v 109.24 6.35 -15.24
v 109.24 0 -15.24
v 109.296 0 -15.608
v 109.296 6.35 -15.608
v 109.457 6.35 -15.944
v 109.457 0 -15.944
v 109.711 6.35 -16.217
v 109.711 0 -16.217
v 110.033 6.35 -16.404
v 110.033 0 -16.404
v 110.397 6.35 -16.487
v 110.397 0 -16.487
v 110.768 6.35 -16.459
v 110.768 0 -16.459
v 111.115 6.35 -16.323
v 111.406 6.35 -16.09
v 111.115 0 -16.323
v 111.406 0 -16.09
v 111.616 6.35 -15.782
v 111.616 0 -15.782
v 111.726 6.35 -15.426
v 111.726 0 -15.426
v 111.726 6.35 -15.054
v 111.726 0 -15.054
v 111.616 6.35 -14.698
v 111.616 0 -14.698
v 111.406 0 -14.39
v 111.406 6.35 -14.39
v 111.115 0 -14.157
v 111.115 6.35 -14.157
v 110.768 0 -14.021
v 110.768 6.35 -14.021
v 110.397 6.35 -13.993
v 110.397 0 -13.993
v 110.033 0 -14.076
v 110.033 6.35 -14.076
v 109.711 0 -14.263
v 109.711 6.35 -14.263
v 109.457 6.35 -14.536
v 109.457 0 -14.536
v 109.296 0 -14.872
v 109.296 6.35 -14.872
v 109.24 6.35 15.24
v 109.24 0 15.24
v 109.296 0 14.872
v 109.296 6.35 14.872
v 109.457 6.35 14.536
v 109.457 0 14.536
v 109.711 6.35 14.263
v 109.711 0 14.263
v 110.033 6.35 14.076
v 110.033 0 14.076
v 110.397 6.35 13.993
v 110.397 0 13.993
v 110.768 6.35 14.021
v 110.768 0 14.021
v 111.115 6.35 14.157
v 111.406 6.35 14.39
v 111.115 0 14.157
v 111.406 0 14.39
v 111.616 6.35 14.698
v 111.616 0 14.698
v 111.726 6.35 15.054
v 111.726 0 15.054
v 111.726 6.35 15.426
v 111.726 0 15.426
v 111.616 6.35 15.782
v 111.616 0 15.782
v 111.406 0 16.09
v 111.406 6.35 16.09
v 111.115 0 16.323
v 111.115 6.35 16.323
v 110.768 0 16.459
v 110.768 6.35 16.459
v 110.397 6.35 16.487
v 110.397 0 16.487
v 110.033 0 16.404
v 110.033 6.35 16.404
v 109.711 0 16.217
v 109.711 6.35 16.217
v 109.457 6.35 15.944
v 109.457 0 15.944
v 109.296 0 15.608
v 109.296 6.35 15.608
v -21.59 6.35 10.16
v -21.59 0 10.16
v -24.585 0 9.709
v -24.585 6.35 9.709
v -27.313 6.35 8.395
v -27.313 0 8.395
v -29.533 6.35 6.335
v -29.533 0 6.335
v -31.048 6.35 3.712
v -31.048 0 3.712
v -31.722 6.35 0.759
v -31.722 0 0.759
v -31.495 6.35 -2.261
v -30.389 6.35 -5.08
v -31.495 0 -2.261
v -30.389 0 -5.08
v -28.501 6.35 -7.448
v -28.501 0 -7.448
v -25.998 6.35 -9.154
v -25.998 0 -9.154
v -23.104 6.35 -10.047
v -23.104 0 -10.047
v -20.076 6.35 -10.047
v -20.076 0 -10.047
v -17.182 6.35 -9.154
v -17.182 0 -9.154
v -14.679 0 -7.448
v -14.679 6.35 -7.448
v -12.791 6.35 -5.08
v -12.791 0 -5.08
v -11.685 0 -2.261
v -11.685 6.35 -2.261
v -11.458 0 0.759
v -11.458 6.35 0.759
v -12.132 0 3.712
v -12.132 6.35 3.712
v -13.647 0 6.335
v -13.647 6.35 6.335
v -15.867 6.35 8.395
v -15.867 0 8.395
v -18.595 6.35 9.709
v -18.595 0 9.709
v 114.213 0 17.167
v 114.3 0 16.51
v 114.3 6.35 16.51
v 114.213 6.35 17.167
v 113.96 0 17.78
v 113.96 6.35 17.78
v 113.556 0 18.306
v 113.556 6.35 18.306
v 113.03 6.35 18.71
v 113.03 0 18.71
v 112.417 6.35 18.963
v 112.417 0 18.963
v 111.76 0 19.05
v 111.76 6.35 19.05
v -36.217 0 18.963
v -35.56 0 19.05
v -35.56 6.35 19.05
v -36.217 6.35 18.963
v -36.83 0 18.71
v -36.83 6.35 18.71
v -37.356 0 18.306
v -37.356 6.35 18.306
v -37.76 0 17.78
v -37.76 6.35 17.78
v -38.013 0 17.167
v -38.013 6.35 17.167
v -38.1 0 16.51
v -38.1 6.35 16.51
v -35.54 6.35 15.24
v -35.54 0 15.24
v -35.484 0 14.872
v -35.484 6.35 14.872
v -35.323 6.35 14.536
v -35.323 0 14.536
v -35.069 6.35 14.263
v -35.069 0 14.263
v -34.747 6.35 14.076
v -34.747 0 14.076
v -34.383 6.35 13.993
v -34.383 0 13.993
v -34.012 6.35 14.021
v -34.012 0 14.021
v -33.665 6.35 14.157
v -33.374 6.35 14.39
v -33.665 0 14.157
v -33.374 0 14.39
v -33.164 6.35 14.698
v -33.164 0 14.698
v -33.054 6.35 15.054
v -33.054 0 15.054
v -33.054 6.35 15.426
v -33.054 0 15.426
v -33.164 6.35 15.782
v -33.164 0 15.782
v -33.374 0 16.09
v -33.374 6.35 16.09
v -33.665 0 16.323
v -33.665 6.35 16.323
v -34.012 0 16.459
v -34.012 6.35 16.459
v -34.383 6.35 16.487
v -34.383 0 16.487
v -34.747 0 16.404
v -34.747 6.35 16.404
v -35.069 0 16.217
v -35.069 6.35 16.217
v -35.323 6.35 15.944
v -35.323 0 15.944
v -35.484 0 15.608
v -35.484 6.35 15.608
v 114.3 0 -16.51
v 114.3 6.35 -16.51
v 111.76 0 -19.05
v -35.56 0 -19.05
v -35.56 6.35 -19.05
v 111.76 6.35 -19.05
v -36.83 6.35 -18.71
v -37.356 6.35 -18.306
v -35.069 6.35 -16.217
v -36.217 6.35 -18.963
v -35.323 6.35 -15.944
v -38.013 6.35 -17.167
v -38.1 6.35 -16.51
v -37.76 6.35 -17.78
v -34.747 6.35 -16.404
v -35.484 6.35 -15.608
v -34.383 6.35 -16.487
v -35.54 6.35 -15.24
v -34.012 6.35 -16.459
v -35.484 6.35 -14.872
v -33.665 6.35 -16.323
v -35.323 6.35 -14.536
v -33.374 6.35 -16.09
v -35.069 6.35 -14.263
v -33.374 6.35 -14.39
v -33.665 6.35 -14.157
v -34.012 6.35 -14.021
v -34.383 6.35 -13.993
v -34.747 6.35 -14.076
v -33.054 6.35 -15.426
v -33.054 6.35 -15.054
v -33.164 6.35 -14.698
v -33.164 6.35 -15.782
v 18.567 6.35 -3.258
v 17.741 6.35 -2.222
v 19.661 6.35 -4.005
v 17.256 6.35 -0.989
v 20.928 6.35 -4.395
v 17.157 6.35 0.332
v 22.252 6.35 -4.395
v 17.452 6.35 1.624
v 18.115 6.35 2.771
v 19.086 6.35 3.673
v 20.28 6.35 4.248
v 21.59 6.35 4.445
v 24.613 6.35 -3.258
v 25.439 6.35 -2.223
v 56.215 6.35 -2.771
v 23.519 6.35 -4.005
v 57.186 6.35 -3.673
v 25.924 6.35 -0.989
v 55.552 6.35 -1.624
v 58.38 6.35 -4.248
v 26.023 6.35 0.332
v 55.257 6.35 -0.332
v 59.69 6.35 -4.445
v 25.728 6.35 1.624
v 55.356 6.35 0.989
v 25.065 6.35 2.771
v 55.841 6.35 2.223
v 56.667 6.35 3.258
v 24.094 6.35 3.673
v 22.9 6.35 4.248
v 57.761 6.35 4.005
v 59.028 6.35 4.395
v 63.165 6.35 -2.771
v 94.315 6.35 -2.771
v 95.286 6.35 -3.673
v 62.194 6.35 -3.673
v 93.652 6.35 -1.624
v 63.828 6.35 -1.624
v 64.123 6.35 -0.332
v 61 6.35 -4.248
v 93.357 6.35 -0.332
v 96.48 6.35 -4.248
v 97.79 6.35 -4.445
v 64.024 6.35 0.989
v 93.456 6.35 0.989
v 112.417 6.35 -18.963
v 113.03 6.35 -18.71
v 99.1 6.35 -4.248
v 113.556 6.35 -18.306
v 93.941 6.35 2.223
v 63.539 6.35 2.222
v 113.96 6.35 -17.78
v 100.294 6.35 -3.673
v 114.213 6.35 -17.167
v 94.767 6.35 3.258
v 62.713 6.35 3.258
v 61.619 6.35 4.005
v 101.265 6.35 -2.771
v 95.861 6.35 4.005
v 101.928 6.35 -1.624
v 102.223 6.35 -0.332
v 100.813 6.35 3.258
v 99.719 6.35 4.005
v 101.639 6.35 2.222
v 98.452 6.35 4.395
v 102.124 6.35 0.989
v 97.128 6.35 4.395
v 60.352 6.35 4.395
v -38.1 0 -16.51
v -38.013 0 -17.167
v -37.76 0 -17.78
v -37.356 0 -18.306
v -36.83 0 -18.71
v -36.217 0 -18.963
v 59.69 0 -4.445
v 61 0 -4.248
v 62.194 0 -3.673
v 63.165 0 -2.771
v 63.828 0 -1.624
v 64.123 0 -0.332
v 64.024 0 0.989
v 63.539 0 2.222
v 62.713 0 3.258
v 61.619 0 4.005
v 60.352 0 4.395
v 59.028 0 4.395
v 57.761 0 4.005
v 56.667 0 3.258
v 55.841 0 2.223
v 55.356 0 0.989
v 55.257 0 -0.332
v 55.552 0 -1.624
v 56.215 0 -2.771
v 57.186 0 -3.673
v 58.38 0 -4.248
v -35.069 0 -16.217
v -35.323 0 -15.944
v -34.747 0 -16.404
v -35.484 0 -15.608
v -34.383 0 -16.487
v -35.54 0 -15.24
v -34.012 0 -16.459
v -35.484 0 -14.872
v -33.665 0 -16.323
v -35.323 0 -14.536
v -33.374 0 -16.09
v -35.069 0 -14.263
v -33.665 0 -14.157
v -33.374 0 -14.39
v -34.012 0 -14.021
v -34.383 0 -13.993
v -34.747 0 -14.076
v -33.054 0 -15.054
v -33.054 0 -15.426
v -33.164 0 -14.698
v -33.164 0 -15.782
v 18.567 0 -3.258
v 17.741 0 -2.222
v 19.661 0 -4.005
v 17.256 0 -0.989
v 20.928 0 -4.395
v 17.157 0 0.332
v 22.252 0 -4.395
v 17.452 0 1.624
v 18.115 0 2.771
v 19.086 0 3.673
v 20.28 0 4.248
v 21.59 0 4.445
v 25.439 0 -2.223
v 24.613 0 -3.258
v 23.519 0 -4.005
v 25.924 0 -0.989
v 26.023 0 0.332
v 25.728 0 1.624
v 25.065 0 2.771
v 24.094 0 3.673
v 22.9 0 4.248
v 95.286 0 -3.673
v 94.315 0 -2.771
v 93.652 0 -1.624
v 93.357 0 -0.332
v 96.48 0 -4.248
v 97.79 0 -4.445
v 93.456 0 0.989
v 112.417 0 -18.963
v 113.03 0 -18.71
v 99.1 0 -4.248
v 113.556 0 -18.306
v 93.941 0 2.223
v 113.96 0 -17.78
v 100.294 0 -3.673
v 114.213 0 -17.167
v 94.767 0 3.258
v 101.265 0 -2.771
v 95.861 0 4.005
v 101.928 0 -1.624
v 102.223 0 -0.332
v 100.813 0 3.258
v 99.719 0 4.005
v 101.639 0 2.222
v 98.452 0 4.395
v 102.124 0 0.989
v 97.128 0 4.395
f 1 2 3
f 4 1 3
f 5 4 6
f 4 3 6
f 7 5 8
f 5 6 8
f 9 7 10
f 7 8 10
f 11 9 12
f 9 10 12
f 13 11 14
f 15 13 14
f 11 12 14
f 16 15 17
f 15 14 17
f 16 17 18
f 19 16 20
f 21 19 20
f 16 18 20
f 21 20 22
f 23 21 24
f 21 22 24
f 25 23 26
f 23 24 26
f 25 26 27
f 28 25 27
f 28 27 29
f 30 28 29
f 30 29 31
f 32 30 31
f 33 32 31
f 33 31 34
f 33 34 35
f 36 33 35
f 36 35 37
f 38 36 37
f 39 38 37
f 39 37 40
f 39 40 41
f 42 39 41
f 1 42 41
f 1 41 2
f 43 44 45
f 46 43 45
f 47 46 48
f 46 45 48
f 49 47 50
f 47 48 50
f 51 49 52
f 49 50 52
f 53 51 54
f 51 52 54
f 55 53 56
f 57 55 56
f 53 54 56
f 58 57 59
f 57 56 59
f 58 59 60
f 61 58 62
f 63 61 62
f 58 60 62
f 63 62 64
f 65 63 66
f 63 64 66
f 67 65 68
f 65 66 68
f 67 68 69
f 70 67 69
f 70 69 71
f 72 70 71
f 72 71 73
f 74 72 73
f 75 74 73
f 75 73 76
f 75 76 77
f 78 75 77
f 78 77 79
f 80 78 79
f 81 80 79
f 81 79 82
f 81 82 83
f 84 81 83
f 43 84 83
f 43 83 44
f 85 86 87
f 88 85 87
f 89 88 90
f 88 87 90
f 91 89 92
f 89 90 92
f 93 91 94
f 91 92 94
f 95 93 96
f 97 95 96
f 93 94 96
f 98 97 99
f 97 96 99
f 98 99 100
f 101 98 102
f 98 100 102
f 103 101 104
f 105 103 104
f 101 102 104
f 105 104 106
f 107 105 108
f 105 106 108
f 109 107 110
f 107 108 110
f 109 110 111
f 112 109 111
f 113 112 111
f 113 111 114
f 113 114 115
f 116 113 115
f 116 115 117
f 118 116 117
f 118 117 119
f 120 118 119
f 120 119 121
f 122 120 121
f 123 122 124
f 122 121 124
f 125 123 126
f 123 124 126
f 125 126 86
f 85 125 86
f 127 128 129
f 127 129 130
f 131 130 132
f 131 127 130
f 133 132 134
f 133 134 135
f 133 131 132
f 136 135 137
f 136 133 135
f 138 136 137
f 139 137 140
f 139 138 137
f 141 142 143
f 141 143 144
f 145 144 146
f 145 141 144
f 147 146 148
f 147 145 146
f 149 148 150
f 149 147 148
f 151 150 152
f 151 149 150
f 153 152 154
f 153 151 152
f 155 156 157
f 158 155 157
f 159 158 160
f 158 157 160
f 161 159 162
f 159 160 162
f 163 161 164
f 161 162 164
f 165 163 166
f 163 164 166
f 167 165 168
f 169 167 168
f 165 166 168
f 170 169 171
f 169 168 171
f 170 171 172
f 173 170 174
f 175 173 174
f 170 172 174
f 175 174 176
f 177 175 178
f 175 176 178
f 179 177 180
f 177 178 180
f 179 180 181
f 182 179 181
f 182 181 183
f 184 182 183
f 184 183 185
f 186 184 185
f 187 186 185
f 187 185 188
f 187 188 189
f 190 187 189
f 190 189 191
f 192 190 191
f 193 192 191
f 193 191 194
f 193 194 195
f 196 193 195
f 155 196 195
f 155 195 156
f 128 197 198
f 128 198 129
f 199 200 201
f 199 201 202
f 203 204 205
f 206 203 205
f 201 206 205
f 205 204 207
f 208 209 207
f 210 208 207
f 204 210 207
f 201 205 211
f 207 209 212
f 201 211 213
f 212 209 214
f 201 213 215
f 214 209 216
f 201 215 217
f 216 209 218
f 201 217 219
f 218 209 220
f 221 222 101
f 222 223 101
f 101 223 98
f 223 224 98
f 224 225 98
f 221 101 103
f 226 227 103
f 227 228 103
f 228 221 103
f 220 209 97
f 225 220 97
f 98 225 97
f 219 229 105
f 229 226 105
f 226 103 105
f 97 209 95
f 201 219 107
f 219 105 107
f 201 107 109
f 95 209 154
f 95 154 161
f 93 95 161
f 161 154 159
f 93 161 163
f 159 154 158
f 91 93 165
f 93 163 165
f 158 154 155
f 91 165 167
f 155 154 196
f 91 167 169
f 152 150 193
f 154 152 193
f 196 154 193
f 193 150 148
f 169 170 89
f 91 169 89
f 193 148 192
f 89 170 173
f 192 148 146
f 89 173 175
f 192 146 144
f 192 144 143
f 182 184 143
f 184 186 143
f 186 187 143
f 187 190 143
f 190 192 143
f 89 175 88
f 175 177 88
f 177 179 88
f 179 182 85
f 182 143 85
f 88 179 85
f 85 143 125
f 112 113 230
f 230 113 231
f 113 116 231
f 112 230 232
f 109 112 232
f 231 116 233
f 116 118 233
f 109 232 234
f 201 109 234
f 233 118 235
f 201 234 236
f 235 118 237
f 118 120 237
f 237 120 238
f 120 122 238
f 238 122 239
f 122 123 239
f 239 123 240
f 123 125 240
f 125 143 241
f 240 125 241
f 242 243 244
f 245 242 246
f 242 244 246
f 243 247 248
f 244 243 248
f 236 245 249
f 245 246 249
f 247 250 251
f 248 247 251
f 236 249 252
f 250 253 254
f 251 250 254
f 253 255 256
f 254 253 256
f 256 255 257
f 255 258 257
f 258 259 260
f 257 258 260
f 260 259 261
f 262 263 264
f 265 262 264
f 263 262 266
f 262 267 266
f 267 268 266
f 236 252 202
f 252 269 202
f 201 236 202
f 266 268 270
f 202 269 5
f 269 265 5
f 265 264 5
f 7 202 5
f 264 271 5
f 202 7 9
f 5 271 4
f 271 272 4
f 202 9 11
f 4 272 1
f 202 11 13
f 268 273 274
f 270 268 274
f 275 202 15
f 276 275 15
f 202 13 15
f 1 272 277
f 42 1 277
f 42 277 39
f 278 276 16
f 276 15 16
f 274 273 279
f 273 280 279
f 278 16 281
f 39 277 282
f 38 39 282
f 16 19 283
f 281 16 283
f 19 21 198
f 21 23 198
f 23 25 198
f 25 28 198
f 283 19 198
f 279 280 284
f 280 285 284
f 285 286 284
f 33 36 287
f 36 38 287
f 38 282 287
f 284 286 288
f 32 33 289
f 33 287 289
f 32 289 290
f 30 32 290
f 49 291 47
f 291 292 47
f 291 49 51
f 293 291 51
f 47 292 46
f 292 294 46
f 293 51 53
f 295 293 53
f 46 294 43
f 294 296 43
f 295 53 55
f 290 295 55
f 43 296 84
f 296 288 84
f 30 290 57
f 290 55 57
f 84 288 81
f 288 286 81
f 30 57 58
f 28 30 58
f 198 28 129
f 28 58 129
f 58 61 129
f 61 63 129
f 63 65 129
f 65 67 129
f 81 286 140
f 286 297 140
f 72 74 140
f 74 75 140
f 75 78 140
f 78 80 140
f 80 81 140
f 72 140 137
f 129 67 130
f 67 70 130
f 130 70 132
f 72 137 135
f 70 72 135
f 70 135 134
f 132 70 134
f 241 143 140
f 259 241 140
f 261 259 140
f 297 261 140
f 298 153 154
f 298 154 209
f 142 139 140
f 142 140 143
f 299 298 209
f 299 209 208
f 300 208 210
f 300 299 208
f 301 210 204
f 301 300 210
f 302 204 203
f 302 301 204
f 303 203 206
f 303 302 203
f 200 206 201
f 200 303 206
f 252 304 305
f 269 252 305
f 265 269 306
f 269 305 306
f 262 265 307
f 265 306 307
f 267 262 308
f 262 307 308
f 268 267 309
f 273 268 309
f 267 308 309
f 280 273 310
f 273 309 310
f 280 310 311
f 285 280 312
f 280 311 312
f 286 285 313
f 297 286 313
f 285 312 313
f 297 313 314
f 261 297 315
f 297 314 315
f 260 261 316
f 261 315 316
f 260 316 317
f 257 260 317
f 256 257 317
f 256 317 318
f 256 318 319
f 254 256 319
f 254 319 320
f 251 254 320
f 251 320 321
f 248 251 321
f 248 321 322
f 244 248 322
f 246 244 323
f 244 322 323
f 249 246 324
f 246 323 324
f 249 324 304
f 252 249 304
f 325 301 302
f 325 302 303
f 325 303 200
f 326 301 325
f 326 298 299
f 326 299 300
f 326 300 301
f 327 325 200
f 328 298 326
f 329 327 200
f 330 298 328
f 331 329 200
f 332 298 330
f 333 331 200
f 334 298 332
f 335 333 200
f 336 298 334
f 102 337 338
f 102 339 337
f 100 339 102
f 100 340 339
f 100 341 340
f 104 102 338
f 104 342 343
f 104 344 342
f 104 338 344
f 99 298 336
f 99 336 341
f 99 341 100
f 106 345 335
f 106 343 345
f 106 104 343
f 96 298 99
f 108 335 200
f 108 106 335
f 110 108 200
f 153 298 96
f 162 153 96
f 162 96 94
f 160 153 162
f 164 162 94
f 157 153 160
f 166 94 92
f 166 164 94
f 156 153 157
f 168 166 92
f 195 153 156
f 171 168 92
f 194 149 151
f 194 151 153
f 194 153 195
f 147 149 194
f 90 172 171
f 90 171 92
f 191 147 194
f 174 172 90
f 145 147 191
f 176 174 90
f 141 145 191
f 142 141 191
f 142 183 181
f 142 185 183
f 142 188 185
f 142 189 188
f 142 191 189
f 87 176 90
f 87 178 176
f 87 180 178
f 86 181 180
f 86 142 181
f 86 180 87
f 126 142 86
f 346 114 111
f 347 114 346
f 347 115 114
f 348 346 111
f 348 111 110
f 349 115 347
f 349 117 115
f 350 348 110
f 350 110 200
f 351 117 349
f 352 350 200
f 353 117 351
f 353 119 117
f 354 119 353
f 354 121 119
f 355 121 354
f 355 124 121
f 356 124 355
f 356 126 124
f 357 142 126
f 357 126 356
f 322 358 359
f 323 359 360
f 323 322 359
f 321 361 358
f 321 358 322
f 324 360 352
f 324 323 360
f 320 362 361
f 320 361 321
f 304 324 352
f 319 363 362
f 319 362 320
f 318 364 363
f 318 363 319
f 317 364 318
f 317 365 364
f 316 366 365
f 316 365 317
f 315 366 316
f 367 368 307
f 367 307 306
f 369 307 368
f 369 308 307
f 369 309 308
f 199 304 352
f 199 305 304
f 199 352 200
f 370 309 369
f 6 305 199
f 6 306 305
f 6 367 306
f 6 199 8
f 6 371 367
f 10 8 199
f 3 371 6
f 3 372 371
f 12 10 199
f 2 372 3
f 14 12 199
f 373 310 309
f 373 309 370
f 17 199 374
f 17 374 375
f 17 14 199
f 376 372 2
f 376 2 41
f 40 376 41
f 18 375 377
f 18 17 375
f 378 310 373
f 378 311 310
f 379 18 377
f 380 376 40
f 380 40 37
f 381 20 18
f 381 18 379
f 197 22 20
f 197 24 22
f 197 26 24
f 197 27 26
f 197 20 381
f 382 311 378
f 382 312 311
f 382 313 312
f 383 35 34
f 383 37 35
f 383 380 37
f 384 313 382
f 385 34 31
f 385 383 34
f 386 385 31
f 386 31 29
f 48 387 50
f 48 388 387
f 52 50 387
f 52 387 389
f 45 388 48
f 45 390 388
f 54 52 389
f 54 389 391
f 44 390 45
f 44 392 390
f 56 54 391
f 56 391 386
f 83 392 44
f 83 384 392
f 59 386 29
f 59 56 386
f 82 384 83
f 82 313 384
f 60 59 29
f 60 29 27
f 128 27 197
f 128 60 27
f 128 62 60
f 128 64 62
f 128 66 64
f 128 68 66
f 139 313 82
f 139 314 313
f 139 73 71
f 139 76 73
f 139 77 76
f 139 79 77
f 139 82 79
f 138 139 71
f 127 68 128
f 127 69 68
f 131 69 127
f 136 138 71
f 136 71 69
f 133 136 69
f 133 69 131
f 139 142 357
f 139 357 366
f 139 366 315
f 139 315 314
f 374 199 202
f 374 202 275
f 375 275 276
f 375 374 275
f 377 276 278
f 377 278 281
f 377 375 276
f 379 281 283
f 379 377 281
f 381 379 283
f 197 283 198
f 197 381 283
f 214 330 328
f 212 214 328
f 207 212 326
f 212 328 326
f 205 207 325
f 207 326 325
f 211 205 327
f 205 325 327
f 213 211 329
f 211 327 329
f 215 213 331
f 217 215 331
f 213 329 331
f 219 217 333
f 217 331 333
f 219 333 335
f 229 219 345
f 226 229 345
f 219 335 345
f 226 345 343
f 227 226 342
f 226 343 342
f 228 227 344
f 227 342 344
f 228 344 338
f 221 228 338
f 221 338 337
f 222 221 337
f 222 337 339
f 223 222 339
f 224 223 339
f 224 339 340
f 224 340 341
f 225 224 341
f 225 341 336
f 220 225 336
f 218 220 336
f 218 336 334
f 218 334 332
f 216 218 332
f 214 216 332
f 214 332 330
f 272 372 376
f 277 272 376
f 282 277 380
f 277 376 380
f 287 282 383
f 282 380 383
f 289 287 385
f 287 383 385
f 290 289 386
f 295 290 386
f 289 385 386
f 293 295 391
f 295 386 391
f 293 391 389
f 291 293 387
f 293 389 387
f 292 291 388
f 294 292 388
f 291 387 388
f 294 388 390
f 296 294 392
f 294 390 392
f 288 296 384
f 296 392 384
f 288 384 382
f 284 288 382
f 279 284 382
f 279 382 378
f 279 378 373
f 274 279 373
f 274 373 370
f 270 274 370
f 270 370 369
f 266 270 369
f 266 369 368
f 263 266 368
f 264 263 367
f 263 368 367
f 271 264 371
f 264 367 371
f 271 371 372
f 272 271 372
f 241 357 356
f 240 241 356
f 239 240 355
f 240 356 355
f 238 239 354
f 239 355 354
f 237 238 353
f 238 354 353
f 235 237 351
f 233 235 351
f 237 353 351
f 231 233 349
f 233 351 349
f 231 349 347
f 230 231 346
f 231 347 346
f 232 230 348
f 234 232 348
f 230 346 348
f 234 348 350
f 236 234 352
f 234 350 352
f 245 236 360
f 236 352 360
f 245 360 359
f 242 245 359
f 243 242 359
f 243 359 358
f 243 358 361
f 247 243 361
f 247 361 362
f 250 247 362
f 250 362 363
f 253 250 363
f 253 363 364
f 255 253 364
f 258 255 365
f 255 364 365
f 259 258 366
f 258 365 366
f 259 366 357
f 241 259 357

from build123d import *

# Parameters (mm, degrees)
SKETCH1_R             = 4.445
SKETCH1_R_2           = 10.16
BOSS_EXTRUDE1_DEPTH   = 6.35
M3X0_5_TAPPED_HOLE1_D = 2.5


with BuildPart() as part:
    # Sketch1 → Boss-Extrude1 (new body)
    with BuildSketch(Plane.XZ):
        with BuildLine():
            Line((-35.56, -19.05), (111.76, -19.05))
            ThreePointArc((111.76, -19.05), (113.556051224, -18.306051224), (114.3, -16.51))
            Line((114.3, -16.51), (114.3, 16.51))
            ThreePointArc((114.3, 16.51), (113.556051224, 18.306051224), (111.76, 19.05))
            Line((111.76, 19.05), (-35.56, 19.05))
            ThreePointArc((-35.56, 19.05), (-37.356051224, 18.306051224), (-38.1, 16.51))
            Line((-38.1, 16.51), (-38.1, -16.51))
            ThreePointArc((-38.1, -16.51), (-37.356051224, -18.306051224), (-35.56, -19.05))
        make_face()
        with Locations(Location((59.69, 0, 0), (0, 0, 270))):
            Circle(SKETCH1_R, mode=Mode.SUBTRACT)
        with Locations(Location((97.79, 0, 0), (0, 0, 270))):
            Circle(SKETCH1_R, mode=Mode.SUBTRACT)
        with Locations(Location((21.59, 0, 0), (0, 0, 90))):
            Circle(SKETCH1_R, mode=Mode.SUBTRACT)
        with Locations(Location((-21.59, 0, 0), (0, 0, 90))):
            Circle(SKETCH1_R_2, mode=Mode.SUBTRACT)
    extrude(amount=-BOSS_EXTRUDE1_DEPTH)

    # M3x0.5 Tapped Hole1 (through all)
    with Locations(Plane(origin=(0, 6.35, 0), x_dir=(1, 0, 0), z_dir=(0, 1, 0))):
        with Locations((-34.29, 15.24), (110.49, 15.24), (110.49, -15.24), (-34.29, -15.24)):
            Hole(M3X0_5_TAPPED_HOLE1_D / 2)


solid = part.part
